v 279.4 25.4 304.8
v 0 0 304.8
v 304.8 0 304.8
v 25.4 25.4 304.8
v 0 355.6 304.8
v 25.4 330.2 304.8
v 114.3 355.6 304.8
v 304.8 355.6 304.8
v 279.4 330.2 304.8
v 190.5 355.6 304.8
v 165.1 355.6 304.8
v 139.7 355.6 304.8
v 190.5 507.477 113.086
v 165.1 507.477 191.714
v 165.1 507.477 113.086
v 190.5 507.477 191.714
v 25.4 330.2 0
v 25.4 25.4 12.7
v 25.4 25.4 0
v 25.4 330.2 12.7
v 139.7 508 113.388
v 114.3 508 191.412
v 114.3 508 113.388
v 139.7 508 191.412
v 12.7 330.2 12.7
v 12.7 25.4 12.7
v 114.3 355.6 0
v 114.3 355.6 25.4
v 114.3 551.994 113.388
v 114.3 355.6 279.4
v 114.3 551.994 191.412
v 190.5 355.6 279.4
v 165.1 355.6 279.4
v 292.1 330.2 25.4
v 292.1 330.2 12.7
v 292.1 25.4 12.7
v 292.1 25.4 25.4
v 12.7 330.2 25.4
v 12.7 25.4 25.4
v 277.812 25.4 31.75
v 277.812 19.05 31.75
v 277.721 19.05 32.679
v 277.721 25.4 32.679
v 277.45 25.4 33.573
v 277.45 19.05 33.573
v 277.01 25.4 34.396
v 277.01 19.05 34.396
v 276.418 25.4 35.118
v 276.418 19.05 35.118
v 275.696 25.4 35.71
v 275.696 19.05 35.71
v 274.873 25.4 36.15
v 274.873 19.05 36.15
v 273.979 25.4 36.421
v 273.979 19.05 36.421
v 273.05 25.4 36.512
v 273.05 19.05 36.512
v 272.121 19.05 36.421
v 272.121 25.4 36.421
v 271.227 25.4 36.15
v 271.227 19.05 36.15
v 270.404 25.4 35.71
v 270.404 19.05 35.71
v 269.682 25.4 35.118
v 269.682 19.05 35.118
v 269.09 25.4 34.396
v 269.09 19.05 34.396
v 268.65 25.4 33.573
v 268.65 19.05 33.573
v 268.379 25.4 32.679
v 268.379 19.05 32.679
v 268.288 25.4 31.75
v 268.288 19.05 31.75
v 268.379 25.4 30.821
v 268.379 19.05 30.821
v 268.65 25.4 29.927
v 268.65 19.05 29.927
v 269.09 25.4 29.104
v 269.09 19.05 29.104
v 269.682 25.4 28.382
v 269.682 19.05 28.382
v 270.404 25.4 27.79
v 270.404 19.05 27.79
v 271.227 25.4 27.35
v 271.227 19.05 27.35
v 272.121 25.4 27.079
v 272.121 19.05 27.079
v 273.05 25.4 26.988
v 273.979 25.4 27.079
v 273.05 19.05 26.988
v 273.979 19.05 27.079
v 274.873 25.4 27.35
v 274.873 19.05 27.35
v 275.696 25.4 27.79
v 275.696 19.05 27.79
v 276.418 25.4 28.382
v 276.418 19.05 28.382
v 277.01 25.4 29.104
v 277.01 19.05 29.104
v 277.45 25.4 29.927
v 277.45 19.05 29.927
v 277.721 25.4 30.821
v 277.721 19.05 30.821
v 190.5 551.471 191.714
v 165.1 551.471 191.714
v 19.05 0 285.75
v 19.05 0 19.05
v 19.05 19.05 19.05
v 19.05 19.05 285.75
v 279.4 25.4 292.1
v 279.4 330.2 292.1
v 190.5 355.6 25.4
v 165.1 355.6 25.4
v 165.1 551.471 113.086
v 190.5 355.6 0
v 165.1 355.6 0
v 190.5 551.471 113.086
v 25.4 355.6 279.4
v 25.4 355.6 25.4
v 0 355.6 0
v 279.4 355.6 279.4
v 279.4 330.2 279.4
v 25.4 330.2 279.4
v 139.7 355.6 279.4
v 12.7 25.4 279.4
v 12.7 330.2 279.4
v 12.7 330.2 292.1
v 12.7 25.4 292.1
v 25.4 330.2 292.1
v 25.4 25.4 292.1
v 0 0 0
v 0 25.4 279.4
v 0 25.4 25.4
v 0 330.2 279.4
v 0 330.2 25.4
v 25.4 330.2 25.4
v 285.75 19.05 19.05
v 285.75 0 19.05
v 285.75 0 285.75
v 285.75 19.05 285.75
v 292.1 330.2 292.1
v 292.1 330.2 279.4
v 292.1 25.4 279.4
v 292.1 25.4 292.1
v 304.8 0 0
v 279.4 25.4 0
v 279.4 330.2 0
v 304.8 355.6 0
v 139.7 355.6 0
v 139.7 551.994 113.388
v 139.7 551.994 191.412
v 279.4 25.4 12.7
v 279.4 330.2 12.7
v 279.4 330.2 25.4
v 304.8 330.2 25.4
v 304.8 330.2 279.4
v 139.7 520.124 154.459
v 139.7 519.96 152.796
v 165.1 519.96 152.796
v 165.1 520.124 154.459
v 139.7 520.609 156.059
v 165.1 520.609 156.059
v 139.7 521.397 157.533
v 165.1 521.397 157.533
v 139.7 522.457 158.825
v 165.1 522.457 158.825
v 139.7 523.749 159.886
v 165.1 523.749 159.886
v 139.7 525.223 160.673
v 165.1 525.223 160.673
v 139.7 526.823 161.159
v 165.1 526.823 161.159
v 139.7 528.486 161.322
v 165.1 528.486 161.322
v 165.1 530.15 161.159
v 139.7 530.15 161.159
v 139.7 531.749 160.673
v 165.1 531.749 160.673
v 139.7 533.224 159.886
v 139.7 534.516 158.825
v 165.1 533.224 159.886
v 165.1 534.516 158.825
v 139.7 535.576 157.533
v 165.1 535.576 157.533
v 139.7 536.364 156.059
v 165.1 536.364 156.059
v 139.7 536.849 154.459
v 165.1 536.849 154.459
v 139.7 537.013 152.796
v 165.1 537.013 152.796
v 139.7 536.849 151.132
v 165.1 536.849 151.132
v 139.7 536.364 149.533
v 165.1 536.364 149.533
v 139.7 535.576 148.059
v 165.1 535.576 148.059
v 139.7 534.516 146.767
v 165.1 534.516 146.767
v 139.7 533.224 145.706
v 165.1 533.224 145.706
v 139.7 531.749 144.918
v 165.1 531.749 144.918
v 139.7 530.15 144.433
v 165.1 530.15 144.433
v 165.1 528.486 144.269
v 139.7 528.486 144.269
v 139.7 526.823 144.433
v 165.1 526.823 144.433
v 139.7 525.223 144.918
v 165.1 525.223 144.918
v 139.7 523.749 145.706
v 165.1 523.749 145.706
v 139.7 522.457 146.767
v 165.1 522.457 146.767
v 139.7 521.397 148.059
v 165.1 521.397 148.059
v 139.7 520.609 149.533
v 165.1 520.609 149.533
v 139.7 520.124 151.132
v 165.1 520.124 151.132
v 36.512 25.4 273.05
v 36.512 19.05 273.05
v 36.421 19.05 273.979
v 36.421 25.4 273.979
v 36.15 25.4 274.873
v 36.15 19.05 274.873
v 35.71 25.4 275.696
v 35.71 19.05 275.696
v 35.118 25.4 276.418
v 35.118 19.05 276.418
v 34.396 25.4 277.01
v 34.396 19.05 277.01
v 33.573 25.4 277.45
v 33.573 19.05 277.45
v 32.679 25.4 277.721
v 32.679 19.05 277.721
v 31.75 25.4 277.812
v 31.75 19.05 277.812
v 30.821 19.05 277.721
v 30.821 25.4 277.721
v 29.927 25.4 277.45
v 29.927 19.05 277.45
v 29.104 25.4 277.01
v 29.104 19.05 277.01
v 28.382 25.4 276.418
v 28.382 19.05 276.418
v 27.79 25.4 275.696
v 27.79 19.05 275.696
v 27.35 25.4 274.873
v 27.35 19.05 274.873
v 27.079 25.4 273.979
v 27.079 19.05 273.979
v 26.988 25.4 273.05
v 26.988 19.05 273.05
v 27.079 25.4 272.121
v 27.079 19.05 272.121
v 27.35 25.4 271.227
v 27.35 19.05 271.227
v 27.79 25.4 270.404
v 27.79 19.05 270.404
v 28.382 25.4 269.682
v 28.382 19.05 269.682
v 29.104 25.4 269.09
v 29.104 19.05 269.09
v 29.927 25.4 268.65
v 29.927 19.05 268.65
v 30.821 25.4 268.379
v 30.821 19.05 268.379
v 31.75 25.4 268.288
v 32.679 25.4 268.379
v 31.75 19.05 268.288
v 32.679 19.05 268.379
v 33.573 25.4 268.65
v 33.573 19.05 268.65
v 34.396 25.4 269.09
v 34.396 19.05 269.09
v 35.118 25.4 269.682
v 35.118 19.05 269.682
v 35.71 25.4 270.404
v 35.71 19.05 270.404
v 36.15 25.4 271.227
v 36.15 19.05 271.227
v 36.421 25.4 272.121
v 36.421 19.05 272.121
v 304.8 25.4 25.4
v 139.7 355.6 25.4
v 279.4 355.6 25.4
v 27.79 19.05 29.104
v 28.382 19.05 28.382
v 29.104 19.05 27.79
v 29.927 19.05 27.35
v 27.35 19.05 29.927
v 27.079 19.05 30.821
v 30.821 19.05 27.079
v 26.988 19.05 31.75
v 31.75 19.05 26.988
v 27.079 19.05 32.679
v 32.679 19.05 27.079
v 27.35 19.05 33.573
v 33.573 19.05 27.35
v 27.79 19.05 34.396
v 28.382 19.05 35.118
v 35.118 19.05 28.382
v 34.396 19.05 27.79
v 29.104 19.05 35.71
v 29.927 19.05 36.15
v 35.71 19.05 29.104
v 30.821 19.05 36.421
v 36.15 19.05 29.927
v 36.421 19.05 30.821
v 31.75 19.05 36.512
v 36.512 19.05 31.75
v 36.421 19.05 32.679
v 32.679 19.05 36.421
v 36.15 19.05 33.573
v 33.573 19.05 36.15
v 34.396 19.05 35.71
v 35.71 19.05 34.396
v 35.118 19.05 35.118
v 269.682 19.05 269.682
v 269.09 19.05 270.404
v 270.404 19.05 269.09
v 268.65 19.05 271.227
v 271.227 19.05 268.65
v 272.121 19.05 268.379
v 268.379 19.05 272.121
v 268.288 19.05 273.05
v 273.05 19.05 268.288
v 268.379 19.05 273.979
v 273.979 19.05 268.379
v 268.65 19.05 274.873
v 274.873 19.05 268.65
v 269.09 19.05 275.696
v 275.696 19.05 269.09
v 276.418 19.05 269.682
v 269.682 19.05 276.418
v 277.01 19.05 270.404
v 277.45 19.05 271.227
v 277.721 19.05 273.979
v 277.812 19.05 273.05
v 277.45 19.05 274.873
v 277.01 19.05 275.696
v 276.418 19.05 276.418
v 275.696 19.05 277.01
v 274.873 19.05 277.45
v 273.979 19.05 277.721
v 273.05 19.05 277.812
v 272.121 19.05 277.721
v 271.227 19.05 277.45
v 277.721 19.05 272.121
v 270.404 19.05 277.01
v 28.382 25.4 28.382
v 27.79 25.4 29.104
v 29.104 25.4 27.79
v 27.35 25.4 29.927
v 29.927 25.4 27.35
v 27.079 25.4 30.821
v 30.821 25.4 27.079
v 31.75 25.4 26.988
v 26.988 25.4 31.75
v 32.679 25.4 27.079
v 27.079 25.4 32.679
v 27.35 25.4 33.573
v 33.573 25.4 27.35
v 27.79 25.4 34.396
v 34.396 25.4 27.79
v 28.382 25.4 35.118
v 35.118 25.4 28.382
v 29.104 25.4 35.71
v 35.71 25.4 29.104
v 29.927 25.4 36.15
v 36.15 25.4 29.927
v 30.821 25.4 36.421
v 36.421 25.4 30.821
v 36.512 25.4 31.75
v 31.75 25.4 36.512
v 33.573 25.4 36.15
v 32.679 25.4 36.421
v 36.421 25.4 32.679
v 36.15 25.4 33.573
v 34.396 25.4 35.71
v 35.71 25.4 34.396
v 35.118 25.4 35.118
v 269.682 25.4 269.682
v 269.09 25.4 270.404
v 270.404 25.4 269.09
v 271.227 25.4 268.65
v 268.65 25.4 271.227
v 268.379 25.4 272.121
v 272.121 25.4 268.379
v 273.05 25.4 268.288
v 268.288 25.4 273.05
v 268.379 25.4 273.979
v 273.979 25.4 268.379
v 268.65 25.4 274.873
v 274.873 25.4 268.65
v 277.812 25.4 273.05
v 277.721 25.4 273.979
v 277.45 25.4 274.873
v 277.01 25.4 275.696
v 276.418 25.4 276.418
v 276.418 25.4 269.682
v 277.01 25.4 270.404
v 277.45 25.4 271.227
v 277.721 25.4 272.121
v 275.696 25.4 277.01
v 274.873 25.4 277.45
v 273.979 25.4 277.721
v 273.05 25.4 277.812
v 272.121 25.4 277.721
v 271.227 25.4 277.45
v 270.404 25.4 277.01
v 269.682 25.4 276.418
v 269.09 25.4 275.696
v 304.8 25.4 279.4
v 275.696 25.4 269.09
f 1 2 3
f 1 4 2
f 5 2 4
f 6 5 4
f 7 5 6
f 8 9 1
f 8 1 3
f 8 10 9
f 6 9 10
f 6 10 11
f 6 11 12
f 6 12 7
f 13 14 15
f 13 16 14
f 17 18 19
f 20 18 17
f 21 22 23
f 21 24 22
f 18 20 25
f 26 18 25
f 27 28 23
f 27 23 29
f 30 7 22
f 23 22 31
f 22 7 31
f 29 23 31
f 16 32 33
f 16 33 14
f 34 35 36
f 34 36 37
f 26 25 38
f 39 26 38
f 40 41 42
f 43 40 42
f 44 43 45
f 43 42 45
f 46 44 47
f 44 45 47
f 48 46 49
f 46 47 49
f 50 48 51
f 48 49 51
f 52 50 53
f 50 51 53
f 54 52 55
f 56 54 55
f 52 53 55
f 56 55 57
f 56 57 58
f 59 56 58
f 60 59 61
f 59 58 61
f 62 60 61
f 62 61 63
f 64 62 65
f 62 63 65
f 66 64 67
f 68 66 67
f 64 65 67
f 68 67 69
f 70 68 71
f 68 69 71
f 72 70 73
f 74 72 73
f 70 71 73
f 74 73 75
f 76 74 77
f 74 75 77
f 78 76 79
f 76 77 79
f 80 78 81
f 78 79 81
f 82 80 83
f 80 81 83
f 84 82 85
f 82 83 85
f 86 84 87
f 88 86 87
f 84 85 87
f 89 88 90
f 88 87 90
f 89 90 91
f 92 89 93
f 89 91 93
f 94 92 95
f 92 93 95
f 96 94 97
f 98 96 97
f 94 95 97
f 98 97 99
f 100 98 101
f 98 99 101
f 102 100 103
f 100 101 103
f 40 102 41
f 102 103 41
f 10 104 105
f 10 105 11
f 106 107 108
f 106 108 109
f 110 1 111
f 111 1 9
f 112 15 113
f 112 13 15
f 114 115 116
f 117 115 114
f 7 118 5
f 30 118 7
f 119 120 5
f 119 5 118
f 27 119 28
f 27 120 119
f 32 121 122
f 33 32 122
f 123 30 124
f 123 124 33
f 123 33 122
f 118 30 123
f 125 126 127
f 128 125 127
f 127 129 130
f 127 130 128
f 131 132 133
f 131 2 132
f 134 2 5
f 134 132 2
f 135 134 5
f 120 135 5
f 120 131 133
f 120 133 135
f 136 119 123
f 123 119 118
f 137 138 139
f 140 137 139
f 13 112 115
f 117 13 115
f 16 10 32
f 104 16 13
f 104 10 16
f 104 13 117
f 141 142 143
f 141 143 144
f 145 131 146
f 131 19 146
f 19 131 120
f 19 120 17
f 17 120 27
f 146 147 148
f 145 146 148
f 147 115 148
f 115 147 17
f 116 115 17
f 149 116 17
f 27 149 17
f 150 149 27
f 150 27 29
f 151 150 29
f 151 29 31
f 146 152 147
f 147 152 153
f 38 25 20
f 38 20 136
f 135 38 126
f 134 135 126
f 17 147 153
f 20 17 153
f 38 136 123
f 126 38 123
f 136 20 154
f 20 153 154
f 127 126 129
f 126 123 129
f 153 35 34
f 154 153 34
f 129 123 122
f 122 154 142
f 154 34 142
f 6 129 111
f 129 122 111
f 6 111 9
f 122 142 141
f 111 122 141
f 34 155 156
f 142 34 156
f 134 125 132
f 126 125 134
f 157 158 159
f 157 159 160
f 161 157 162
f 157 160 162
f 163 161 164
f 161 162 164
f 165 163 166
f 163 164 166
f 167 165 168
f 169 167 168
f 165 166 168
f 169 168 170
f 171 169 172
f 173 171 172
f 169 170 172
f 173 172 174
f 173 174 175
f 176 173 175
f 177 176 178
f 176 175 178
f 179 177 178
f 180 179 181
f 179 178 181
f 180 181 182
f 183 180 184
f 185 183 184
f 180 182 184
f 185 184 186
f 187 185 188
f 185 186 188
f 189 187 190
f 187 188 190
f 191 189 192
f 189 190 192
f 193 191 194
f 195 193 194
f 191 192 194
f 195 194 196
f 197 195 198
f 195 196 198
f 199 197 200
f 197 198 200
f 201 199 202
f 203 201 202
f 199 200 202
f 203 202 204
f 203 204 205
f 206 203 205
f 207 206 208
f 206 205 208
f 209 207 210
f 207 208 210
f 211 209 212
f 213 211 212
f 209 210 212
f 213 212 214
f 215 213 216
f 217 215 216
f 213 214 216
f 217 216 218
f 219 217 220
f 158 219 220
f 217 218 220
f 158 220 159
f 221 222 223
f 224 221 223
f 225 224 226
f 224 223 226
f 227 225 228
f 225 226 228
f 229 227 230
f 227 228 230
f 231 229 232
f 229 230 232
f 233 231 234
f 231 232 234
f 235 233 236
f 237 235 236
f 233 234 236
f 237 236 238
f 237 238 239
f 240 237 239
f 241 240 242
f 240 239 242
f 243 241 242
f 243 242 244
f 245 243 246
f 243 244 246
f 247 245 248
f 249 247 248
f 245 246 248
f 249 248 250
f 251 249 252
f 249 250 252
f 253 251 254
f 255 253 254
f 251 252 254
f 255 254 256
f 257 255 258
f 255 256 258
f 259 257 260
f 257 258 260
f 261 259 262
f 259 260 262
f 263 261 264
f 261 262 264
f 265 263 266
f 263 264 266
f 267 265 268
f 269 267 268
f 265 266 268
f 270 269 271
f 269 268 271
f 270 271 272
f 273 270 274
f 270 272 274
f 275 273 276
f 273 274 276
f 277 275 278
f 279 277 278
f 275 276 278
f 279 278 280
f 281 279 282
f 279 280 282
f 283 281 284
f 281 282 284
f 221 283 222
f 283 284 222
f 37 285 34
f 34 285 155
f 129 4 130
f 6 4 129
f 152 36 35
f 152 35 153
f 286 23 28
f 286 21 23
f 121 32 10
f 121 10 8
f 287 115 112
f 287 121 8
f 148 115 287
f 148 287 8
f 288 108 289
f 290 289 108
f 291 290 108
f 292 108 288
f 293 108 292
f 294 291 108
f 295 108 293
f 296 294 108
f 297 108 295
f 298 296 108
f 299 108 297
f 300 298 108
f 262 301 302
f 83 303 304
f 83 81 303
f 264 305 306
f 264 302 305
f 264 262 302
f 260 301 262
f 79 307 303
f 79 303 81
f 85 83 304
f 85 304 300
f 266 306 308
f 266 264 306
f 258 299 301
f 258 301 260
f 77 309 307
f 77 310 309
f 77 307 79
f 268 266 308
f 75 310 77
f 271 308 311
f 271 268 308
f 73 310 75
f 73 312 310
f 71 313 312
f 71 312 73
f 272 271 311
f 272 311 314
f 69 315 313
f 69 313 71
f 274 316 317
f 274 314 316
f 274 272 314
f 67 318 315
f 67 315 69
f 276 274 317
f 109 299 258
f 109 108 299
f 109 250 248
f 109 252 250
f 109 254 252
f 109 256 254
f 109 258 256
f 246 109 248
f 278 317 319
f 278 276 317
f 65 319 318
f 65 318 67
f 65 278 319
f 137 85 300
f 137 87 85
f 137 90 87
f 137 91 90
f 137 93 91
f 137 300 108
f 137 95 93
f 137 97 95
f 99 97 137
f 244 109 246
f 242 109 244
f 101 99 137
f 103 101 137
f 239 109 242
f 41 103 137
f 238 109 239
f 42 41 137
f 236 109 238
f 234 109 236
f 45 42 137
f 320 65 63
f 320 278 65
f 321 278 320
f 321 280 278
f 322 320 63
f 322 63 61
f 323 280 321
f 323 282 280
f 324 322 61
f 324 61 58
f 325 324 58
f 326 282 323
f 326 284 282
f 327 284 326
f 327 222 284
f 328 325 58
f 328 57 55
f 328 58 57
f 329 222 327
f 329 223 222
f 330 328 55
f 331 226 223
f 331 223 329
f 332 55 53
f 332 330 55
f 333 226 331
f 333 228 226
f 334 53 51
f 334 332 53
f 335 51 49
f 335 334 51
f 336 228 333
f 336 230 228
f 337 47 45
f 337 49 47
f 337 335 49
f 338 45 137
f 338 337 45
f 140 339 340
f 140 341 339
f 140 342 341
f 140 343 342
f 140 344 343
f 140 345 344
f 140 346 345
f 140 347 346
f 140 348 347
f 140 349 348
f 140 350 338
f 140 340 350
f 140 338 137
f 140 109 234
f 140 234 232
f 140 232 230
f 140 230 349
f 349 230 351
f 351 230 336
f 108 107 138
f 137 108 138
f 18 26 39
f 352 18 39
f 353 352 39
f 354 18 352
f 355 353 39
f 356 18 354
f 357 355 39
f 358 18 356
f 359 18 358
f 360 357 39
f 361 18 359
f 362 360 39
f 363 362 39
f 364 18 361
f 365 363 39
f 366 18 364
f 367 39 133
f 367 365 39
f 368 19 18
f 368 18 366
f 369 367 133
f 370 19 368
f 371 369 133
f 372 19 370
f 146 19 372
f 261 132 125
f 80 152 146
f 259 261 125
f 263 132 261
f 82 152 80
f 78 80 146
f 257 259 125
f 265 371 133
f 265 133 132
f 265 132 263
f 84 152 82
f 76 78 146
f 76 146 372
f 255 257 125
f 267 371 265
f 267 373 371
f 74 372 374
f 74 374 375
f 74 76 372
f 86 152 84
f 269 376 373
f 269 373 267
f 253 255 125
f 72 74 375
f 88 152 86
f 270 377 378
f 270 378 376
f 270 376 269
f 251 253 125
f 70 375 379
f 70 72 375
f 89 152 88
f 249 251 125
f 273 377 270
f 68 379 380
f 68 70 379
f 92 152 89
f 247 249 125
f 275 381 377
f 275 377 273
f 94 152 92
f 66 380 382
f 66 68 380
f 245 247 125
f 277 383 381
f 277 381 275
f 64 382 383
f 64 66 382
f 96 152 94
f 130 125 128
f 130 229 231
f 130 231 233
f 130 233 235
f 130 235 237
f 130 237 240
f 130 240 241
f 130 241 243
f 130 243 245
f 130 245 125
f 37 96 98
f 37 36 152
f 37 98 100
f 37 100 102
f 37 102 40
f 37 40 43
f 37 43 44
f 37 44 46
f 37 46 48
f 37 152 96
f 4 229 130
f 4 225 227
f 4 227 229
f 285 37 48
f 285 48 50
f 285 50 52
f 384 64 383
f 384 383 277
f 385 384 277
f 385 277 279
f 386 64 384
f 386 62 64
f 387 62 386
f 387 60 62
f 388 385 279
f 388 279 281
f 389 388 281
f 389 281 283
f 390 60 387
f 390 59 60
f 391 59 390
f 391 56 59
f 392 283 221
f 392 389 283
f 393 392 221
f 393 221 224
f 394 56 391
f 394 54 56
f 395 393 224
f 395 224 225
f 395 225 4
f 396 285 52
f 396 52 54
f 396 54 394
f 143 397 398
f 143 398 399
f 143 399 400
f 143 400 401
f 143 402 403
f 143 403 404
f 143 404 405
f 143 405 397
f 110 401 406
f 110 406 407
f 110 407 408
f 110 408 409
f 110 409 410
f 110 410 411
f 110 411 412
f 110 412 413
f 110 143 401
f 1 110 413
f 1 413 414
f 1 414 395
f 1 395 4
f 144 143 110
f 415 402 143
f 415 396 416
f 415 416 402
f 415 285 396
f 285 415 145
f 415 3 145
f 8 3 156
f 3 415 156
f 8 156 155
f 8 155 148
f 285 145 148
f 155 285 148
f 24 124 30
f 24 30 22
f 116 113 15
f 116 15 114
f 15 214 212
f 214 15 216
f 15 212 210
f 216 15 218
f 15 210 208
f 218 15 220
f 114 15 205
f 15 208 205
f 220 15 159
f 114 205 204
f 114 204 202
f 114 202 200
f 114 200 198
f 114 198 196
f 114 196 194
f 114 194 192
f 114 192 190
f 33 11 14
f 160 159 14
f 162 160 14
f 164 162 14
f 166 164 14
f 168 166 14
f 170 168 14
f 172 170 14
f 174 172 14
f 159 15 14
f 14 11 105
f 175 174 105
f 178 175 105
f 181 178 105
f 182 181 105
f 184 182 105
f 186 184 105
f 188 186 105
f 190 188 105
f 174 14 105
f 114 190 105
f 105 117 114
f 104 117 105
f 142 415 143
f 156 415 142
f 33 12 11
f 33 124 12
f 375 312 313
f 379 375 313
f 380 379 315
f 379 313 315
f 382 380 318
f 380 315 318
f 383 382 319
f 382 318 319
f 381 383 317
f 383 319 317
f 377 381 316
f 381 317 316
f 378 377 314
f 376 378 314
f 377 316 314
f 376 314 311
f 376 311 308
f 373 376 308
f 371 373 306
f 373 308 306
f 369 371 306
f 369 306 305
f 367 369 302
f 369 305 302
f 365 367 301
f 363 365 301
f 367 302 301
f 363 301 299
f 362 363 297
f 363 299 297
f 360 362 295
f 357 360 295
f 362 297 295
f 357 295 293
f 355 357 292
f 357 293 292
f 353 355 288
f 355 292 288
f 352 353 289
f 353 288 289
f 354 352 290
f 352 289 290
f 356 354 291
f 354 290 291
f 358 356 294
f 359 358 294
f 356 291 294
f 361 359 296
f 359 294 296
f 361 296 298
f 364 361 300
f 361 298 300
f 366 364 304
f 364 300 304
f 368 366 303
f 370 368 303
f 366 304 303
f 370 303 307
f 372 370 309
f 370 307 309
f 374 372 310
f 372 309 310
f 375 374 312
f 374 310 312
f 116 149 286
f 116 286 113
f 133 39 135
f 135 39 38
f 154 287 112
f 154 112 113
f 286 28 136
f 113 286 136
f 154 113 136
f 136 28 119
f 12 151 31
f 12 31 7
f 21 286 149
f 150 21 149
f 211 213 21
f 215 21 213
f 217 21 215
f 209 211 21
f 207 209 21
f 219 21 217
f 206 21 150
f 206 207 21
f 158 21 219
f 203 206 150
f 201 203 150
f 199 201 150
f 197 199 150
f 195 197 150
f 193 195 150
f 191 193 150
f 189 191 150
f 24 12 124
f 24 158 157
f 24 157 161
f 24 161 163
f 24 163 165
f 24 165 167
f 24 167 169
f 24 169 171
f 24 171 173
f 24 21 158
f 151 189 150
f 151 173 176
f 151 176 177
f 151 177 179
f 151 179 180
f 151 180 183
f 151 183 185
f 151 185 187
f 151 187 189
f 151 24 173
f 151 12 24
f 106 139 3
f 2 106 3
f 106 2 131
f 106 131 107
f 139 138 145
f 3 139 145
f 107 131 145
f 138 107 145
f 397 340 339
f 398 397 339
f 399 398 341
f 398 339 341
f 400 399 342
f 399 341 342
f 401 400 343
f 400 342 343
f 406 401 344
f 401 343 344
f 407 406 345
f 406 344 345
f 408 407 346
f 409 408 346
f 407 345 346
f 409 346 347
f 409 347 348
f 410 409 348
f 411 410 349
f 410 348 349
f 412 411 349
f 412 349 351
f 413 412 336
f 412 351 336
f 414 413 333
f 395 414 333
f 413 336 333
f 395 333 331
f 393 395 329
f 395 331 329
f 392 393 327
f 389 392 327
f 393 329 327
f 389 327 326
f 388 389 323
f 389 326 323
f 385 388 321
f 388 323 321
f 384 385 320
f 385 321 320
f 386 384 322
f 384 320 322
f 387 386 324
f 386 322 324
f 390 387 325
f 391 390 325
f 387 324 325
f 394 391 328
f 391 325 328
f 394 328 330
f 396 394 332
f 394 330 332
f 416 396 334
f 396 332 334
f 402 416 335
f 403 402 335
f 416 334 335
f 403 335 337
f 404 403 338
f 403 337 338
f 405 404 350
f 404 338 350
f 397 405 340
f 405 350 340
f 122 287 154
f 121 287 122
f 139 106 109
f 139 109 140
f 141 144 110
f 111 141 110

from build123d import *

# Parameters (mm, degrees)
F0_W      = 304.8
F0_H      = 355.6
F1_DEPTH  = 304.8
F2_W      = 254
F2_H      = 304.8
F3_DEPTH  = 304.801
F4_W      = 304.8
F4_H      = 254
F5_DEPTH  = 304.801
F6_W      = 254
F6_H      = 254
F7_DEPTH  = 25.4
F8_W      = 266.7
F8_H      = 266.7
F9_DEPTH  = 19.05
F10_W     = 279.4
F10_H     = 279.4
F11_DEPTH = 304.8
F12_R     = 4.7625
F13_DEPTH = 6.35
F16_DEPTH = 12.7
F19_DEPTH = 12.7
F20_R     = 8.526581
F21_DEPTH = 25.4


with BuildPart() as f1:
    # F0 (on Top) → F1 (new body)
    with BuildSketch(Plane.XY):
        with Locations((152.4, 177.8)):
            Rectangle(F0_W, F0_H)
    extrude(amount=F1_DEPTH)

    # F2 (on face) → F3 (cut, through all)
    with BuildSketch(Plane.XY.offset(304.8)):
        with Locations((152.4, 177.8)):
            Rectangle(F2_W, F2_H)
    extrude(amount=-F3_DEPTH, mode=Mode.SUBTRACT)

    # F4 (on face) → F5 (cut, through all)
    with BuildSketch(Plane.YZ.offset(304.8)):
        with Locations((177.8, 152.4)):
            Rectangle(F4_W, F4_H)
    extrude(amount=-F5_DEPTH, mode=Mode.SUBTRACT)

    # F6 (on face) → F7 (cut)
    with BuildSketch(Plane(origin=(0, 355.6, 0), x_dir=(-1, 0, 0), z_dir=(0, 1, 0))):
        with Locations((-152.4, 152.4)):
            Rectangle(F6_W, F6_H)
    extrude(amount=-F7_DEPTH, mode=Mode.SUBTRACT)

    # F8 (on face) → F9 (cut)
    with BuildSketch(Plane.XZ):
        with Locations((152.4, 152.4)):
            Rectangle(F8_W, F8_H)
    extrude(amount=-F9_DEPTH, mode=Mode.SUBTRACT)

    # F10 (on face) → F11 (cut)
    with BuildSketch(Plane(origin=(0, 25.4, 0), x_dir=(-1, 0, 0), z_dir=(0, 1, 0))):
        with Locations((-152.4, 152.4)):
            Rectangle(F10_W, F10_H)
    extrude(amount=F11_DEPTH, mode=Mode.SUBTRACT)

    # F12 (on face) → F13 (cut)
    with BuildSketch(Plane.XZ.offset(-19.05)):
        with Locations((31.75, 273.05)):
            Circle(F12_R)
        with Locations((273.05, 273.05)):
            Circle(F12_R)
        with Locations((273.05, 31.75)):
            Circle(F12_R)
        with Locations((31.75, 31.75)):
            Circle(F12_R)
    extrude(amount=-F13_DEPTH, mode=Mode.SUBTRACT)

    # F15 (on offset) → F16 (join, symmetric)
    with BuildSketch(Plane.YZ.offset(127)):
        Polygon((355.6, 25.4), (355.6, 0), (551.994091, 113.388181), (551.994091, 191.411819), (355.6, 304.8), (355.6, 279.4), (508, 191.411819), (508, 113.388181), align=None)
    extrude(amount=F16_DEPTH, both=True)

    # F18 (on offset) → F19 (join, symmetric)
    with BuildSketch(Plane.YZ.offset(177.8)):
        Polygon((355.6, 25.4), (355.6, 0), (551.470828, 113.086075), (551.470828, 191.713925), (355.6, 304.8), (355.6, 279.4), (507.476737, 191.713925), (507.476737, 113.086075), align=None)
    extrude(amount=F19_DEPTH, both=True)

    # F20 (on face) → F21 (join)
    with BuildSketch(Plane(origin=(165.1, 0, 0), x_dir=(0, -1, 0), z_dir=(-1, 0, 0))):
        with Locations((-528.486431, 152.795911)):
            Circle(F20_R)
    extrude(amount=F21_DEPTH)


solid = f1.part
